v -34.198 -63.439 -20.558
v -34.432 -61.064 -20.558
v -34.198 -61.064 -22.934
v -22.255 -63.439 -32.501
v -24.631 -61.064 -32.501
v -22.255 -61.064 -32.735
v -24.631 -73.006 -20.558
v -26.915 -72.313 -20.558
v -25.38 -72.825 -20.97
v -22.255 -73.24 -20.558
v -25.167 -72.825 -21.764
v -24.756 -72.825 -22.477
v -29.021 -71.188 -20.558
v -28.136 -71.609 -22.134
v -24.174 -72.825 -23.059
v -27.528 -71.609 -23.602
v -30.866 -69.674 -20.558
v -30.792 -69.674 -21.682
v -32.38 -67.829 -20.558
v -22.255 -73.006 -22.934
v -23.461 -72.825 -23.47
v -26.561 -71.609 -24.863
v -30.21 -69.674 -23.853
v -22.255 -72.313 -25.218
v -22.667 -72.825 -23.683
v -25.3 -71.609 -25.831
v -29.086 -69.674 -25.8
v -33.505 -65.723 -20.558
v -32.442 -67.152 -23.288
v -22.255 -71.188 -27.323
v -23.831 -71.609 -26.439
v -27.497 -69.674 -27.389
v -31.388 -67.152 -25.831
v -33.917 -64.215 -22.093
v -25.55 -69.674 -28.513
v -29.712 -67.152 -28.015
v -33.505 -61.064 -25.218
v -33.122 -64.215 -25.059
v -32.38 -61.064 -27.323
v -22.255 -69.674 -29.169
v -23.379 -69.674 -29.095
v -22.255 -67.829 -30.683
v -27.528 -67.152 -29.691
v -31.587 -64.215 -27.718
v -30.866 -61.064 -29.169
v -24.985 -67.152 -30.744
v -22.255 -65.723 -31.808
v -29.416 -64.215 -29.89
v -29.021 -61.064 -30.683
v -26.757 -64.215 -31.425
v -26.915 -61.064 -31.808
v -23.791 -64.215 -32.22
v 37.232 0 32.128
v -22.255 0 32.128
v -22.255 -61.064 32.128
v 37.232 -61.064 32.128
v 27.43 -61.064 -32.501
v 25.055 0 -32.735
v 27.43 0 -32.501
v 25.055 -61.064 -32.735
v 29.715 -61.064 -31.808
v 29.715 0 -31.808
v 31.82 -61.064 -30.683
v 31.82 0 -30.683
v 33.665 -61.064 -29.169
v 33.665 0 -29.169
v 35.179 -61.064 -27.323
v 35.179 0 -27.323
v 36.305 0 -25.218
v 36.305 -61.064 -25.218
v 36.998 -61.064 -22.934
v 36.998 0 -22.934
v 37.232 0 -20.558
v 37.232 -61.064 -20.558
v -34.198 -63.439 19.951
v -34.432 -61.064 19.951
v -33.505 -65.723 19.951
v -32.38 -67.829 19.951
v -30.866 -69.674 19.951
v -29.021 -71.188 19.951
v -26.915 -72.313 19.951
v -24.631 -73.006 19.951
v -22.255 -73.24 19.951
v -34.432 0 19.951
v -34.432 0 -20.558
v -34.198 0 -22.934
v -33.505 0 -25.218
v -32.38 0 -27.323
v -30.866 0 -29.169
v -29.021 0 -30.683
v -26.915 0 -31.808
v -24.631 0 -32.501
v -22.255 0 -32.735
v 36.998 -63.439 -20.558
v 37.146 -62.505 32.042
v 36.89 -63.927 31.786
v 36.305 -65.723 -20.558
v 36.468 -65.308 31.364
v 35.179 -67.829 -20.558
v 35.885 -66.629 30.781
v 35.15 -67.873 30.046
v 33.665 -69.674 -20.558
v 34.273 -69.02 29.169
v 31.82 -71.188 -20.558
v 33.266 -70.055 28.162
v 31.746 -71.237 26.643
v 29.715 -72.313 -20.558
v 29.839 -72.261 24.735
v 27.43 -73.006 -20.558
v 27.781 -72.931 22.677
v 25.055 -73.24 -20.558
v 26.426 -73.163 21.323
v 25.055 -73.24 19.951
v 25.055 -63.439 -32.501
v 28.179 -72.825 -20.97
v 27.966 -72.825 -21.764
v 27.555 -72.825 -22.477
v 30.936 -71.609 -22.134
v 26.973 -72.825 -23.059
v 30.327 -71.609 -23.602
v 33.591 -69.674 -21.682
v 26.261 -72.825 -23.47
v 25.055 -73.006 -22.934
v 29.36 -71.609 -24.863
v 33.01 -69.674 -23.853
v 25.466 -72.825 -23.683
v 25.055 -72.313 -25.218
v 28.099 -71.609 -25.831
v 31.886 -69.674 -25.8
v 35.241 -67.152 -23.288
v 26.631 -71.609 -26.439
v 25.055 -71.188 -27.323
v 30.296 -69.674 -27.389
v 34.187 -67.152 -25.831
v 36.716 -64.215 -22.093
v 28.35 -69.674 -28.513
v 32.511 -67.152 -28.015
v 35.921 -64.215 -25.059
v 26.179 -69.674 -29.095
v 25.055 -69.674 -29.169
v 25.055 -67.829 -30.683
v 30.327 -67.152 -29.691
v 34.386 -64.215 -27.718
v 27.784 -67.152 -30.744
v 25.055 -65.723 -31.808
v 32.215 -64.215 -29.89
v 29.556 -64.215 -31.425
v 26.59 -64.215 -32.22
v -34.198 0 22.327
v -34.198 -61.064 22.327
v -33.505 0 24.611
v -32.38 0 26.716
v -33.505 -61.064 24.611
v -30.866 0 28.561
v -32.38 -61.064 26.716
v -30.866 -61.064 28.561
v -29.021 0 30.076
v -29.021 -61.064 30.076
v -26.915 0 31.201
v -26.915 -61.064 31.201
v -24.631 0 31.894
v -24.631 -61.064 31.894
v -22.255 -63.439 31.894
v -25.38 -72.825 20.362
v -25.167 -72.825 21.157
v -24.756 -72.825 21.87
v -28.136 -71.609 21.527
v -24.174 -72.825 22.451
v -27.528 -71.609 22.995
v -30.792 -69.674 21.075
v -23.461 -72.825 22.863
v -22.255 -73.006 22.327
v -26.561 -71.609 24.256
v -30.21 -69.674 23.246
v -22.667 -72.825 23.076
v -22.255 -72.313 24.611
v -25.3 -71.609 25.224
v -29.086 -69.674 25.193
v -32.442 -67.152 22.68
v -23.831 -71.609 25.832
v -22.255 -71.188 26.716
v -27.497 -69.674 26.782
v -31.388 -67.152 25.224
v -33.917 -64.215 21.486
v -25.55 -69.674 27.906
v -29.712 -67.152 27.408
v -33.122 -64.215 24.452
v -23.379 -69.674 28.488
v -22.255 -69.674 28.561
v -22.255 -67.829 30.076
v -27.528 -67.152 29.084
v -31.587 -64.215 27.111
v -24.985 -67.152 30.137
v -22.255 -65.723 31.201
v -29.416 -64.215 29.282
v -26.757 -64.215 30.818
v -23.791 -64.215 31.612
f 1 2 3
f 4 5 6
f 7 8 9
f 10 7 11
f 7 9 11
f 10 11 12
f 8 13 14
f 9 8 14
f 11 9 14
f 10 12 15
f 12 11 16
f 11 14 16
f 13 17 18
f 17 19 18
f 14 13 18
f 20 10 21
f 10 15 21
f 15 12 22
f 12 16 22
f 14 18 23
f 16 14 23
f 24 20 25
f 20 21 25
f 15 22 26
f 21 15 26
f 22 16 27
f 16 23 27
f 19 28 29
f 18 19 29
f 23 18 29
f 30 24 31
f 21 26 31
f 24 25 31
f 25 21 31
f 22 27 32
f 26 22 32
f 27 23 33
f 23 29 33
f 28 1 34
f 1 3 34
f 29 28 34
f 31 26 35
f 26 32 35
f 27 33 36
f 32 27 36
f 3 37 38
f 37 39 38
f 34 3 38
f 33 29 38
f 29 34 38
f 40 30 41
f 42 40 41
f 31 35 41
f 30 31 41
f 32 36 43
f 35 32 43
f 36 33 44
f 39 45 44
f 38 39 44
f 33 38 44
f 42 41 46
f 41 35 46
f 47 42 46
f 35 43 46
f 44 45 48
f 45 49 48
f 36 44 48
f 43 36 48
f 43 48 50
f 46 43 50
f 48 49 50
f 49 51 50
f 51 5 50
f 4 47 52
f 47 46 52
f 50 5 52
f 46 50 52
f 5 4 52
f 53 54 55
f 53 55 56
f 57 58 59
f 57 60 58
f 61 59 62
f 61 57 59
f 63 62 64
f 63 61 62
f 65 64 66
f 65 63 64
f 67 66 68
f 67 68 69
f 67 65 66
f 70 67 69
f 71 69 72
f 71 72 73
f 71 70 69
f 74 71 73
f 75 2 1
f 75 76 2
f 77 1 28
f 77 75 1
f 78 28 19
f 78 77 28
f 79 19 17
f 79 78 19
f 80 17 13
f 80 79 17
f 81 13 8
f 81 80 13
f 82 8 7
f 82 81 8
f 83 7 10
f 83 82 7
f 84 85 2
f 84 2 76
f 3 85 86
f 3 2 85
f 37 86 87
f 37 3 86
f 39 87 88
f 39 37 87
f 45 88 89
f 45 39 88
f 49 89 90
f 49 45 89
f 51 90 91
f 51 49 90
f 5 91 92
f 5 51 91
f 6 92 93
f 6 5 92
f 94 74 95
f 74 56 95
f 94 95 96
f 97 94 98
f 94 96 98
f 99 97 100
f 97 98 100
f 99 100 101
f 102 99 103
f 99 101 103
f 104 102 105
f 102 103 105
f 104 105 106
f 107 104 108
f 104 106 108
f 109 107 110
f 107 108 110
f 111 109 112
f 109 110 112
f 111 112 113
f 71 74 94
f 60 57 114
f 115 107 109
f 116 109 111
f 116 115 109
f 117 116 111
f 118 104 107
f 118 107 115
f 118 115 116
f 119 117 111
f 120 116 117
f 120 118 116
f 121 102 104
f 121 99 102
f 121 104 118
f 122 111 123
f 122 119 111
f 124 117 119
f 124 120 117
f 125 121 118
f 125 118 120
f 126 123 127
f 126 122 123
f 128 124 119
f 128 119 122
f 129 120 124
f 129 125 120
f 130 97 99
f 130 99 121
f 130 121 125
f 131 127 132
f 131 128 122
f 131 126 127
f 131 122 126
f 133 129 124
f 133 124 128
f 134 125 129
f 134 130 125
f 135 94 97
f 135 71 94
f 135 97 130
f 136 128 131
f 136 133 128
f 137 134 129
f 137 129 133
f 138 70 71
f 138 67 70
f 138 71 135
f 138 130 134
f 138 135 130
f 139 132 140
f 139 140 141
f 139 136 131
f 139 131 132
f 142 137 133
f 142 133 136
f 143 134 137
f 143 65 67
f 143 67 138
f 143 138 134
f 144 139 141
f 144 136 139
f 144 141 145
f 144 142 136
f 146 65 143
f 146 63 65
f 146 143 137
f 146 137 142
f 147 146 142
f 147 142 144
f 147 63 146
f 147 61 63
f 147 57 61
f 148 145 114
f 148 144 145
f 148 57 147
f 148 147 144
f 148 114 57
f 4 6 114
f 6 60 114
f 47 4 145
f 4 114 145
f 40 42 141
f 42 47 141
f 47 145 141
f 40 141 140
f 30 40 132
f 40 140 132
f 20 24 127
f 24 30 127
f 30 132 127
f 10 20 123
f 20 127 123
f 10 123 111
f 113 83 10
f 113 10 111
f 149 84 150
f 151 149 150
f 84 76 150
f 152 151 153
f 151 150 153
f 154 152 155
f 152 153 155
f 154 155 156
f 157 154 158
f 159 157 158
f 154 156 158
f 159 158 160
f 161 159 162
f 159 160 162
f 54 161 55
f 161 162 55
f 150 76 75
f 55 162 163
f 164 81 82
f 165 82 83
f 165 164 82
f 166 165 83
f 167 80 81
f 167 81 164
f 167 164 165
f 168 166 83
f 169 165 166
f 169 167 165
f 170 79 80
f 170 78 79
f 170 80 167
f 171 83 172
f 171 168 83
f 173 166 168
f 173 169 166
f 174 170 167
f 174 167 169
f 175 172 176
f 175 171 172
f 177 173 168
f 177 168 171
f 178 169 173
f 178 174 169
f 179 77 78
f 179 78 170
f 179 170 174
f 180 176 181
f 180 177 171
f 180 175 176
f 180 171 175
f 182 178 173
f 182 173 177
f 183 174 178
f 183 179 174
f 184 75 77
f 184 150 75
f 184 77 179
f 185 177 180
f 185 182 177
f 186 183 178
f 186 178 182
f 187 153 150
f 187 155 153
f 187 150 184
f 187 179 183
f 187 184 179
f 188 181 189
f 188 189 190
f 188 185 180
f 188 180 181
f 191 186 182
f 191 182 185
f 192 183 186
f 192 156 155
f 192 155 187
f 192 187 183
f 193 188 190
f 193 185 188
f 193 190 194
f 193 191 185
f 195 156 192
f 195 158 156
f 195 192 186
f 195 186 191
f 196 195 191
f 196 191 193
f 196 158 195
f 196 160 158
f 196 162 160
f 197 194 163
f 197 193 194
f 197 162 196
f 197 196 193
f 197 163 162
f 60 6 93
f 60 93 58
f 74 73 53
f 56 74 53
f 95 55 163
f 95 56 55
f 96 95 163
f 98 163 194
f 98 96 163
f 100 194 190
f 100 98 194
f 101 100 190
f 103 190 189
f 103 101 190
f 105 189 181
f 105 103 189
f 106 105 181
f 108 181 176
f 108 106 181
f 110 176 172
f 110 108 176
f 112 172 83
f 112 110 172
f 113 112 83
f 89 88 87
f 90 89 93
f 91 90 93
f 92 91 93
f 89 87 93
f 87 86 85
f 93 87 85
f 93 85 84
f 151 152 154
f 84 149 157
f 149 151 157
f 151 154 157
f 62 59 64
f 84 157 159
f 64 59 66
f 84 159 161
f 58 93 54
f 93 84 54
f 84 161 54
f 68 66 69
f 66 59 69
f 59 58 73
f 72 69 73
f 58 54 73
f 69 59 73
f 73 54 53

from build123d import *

# Parameters (mm, degrees)
F1_W     = 71.663826704
F1_H     = 64.8628622293
F2_DEPTH = 73.2403695583
F5_R     = 12.1768440653


# Not quite as in the source:
# - the program builds the solid bodies; features that only make, move or delete a surface that nothing else refers to are left out


with BuildPart() as f2:
    # F1 (on face) → F2 (new body)
    with BuildSketch(Plane.XZ):
        with Locations((1.3996511698, -0.3036260605)):
            Rectangle(F1_W, F1_H)
    extrude(amount=F2_DEPTH)

    # F5
    f5_edges = [f2.edges().sort_by_distance(p)[0] for p in [
        (-34.432262, -36.620185, -32.735057),
        (37.231565, -36.620185, -32.735057),
        (-34.432262, -36.620185, 32.127805),
        (-34.432262, -73.24037, -0.303626),
        (1.399651, -73.24037, 32.127805),
        (37.231565, -73.24037, -0.303626),
        (1.399651, -73.24037, -32.735057),
    ]]
    fillet(f5_edges, radius=F5_R)


solid = f2.part
